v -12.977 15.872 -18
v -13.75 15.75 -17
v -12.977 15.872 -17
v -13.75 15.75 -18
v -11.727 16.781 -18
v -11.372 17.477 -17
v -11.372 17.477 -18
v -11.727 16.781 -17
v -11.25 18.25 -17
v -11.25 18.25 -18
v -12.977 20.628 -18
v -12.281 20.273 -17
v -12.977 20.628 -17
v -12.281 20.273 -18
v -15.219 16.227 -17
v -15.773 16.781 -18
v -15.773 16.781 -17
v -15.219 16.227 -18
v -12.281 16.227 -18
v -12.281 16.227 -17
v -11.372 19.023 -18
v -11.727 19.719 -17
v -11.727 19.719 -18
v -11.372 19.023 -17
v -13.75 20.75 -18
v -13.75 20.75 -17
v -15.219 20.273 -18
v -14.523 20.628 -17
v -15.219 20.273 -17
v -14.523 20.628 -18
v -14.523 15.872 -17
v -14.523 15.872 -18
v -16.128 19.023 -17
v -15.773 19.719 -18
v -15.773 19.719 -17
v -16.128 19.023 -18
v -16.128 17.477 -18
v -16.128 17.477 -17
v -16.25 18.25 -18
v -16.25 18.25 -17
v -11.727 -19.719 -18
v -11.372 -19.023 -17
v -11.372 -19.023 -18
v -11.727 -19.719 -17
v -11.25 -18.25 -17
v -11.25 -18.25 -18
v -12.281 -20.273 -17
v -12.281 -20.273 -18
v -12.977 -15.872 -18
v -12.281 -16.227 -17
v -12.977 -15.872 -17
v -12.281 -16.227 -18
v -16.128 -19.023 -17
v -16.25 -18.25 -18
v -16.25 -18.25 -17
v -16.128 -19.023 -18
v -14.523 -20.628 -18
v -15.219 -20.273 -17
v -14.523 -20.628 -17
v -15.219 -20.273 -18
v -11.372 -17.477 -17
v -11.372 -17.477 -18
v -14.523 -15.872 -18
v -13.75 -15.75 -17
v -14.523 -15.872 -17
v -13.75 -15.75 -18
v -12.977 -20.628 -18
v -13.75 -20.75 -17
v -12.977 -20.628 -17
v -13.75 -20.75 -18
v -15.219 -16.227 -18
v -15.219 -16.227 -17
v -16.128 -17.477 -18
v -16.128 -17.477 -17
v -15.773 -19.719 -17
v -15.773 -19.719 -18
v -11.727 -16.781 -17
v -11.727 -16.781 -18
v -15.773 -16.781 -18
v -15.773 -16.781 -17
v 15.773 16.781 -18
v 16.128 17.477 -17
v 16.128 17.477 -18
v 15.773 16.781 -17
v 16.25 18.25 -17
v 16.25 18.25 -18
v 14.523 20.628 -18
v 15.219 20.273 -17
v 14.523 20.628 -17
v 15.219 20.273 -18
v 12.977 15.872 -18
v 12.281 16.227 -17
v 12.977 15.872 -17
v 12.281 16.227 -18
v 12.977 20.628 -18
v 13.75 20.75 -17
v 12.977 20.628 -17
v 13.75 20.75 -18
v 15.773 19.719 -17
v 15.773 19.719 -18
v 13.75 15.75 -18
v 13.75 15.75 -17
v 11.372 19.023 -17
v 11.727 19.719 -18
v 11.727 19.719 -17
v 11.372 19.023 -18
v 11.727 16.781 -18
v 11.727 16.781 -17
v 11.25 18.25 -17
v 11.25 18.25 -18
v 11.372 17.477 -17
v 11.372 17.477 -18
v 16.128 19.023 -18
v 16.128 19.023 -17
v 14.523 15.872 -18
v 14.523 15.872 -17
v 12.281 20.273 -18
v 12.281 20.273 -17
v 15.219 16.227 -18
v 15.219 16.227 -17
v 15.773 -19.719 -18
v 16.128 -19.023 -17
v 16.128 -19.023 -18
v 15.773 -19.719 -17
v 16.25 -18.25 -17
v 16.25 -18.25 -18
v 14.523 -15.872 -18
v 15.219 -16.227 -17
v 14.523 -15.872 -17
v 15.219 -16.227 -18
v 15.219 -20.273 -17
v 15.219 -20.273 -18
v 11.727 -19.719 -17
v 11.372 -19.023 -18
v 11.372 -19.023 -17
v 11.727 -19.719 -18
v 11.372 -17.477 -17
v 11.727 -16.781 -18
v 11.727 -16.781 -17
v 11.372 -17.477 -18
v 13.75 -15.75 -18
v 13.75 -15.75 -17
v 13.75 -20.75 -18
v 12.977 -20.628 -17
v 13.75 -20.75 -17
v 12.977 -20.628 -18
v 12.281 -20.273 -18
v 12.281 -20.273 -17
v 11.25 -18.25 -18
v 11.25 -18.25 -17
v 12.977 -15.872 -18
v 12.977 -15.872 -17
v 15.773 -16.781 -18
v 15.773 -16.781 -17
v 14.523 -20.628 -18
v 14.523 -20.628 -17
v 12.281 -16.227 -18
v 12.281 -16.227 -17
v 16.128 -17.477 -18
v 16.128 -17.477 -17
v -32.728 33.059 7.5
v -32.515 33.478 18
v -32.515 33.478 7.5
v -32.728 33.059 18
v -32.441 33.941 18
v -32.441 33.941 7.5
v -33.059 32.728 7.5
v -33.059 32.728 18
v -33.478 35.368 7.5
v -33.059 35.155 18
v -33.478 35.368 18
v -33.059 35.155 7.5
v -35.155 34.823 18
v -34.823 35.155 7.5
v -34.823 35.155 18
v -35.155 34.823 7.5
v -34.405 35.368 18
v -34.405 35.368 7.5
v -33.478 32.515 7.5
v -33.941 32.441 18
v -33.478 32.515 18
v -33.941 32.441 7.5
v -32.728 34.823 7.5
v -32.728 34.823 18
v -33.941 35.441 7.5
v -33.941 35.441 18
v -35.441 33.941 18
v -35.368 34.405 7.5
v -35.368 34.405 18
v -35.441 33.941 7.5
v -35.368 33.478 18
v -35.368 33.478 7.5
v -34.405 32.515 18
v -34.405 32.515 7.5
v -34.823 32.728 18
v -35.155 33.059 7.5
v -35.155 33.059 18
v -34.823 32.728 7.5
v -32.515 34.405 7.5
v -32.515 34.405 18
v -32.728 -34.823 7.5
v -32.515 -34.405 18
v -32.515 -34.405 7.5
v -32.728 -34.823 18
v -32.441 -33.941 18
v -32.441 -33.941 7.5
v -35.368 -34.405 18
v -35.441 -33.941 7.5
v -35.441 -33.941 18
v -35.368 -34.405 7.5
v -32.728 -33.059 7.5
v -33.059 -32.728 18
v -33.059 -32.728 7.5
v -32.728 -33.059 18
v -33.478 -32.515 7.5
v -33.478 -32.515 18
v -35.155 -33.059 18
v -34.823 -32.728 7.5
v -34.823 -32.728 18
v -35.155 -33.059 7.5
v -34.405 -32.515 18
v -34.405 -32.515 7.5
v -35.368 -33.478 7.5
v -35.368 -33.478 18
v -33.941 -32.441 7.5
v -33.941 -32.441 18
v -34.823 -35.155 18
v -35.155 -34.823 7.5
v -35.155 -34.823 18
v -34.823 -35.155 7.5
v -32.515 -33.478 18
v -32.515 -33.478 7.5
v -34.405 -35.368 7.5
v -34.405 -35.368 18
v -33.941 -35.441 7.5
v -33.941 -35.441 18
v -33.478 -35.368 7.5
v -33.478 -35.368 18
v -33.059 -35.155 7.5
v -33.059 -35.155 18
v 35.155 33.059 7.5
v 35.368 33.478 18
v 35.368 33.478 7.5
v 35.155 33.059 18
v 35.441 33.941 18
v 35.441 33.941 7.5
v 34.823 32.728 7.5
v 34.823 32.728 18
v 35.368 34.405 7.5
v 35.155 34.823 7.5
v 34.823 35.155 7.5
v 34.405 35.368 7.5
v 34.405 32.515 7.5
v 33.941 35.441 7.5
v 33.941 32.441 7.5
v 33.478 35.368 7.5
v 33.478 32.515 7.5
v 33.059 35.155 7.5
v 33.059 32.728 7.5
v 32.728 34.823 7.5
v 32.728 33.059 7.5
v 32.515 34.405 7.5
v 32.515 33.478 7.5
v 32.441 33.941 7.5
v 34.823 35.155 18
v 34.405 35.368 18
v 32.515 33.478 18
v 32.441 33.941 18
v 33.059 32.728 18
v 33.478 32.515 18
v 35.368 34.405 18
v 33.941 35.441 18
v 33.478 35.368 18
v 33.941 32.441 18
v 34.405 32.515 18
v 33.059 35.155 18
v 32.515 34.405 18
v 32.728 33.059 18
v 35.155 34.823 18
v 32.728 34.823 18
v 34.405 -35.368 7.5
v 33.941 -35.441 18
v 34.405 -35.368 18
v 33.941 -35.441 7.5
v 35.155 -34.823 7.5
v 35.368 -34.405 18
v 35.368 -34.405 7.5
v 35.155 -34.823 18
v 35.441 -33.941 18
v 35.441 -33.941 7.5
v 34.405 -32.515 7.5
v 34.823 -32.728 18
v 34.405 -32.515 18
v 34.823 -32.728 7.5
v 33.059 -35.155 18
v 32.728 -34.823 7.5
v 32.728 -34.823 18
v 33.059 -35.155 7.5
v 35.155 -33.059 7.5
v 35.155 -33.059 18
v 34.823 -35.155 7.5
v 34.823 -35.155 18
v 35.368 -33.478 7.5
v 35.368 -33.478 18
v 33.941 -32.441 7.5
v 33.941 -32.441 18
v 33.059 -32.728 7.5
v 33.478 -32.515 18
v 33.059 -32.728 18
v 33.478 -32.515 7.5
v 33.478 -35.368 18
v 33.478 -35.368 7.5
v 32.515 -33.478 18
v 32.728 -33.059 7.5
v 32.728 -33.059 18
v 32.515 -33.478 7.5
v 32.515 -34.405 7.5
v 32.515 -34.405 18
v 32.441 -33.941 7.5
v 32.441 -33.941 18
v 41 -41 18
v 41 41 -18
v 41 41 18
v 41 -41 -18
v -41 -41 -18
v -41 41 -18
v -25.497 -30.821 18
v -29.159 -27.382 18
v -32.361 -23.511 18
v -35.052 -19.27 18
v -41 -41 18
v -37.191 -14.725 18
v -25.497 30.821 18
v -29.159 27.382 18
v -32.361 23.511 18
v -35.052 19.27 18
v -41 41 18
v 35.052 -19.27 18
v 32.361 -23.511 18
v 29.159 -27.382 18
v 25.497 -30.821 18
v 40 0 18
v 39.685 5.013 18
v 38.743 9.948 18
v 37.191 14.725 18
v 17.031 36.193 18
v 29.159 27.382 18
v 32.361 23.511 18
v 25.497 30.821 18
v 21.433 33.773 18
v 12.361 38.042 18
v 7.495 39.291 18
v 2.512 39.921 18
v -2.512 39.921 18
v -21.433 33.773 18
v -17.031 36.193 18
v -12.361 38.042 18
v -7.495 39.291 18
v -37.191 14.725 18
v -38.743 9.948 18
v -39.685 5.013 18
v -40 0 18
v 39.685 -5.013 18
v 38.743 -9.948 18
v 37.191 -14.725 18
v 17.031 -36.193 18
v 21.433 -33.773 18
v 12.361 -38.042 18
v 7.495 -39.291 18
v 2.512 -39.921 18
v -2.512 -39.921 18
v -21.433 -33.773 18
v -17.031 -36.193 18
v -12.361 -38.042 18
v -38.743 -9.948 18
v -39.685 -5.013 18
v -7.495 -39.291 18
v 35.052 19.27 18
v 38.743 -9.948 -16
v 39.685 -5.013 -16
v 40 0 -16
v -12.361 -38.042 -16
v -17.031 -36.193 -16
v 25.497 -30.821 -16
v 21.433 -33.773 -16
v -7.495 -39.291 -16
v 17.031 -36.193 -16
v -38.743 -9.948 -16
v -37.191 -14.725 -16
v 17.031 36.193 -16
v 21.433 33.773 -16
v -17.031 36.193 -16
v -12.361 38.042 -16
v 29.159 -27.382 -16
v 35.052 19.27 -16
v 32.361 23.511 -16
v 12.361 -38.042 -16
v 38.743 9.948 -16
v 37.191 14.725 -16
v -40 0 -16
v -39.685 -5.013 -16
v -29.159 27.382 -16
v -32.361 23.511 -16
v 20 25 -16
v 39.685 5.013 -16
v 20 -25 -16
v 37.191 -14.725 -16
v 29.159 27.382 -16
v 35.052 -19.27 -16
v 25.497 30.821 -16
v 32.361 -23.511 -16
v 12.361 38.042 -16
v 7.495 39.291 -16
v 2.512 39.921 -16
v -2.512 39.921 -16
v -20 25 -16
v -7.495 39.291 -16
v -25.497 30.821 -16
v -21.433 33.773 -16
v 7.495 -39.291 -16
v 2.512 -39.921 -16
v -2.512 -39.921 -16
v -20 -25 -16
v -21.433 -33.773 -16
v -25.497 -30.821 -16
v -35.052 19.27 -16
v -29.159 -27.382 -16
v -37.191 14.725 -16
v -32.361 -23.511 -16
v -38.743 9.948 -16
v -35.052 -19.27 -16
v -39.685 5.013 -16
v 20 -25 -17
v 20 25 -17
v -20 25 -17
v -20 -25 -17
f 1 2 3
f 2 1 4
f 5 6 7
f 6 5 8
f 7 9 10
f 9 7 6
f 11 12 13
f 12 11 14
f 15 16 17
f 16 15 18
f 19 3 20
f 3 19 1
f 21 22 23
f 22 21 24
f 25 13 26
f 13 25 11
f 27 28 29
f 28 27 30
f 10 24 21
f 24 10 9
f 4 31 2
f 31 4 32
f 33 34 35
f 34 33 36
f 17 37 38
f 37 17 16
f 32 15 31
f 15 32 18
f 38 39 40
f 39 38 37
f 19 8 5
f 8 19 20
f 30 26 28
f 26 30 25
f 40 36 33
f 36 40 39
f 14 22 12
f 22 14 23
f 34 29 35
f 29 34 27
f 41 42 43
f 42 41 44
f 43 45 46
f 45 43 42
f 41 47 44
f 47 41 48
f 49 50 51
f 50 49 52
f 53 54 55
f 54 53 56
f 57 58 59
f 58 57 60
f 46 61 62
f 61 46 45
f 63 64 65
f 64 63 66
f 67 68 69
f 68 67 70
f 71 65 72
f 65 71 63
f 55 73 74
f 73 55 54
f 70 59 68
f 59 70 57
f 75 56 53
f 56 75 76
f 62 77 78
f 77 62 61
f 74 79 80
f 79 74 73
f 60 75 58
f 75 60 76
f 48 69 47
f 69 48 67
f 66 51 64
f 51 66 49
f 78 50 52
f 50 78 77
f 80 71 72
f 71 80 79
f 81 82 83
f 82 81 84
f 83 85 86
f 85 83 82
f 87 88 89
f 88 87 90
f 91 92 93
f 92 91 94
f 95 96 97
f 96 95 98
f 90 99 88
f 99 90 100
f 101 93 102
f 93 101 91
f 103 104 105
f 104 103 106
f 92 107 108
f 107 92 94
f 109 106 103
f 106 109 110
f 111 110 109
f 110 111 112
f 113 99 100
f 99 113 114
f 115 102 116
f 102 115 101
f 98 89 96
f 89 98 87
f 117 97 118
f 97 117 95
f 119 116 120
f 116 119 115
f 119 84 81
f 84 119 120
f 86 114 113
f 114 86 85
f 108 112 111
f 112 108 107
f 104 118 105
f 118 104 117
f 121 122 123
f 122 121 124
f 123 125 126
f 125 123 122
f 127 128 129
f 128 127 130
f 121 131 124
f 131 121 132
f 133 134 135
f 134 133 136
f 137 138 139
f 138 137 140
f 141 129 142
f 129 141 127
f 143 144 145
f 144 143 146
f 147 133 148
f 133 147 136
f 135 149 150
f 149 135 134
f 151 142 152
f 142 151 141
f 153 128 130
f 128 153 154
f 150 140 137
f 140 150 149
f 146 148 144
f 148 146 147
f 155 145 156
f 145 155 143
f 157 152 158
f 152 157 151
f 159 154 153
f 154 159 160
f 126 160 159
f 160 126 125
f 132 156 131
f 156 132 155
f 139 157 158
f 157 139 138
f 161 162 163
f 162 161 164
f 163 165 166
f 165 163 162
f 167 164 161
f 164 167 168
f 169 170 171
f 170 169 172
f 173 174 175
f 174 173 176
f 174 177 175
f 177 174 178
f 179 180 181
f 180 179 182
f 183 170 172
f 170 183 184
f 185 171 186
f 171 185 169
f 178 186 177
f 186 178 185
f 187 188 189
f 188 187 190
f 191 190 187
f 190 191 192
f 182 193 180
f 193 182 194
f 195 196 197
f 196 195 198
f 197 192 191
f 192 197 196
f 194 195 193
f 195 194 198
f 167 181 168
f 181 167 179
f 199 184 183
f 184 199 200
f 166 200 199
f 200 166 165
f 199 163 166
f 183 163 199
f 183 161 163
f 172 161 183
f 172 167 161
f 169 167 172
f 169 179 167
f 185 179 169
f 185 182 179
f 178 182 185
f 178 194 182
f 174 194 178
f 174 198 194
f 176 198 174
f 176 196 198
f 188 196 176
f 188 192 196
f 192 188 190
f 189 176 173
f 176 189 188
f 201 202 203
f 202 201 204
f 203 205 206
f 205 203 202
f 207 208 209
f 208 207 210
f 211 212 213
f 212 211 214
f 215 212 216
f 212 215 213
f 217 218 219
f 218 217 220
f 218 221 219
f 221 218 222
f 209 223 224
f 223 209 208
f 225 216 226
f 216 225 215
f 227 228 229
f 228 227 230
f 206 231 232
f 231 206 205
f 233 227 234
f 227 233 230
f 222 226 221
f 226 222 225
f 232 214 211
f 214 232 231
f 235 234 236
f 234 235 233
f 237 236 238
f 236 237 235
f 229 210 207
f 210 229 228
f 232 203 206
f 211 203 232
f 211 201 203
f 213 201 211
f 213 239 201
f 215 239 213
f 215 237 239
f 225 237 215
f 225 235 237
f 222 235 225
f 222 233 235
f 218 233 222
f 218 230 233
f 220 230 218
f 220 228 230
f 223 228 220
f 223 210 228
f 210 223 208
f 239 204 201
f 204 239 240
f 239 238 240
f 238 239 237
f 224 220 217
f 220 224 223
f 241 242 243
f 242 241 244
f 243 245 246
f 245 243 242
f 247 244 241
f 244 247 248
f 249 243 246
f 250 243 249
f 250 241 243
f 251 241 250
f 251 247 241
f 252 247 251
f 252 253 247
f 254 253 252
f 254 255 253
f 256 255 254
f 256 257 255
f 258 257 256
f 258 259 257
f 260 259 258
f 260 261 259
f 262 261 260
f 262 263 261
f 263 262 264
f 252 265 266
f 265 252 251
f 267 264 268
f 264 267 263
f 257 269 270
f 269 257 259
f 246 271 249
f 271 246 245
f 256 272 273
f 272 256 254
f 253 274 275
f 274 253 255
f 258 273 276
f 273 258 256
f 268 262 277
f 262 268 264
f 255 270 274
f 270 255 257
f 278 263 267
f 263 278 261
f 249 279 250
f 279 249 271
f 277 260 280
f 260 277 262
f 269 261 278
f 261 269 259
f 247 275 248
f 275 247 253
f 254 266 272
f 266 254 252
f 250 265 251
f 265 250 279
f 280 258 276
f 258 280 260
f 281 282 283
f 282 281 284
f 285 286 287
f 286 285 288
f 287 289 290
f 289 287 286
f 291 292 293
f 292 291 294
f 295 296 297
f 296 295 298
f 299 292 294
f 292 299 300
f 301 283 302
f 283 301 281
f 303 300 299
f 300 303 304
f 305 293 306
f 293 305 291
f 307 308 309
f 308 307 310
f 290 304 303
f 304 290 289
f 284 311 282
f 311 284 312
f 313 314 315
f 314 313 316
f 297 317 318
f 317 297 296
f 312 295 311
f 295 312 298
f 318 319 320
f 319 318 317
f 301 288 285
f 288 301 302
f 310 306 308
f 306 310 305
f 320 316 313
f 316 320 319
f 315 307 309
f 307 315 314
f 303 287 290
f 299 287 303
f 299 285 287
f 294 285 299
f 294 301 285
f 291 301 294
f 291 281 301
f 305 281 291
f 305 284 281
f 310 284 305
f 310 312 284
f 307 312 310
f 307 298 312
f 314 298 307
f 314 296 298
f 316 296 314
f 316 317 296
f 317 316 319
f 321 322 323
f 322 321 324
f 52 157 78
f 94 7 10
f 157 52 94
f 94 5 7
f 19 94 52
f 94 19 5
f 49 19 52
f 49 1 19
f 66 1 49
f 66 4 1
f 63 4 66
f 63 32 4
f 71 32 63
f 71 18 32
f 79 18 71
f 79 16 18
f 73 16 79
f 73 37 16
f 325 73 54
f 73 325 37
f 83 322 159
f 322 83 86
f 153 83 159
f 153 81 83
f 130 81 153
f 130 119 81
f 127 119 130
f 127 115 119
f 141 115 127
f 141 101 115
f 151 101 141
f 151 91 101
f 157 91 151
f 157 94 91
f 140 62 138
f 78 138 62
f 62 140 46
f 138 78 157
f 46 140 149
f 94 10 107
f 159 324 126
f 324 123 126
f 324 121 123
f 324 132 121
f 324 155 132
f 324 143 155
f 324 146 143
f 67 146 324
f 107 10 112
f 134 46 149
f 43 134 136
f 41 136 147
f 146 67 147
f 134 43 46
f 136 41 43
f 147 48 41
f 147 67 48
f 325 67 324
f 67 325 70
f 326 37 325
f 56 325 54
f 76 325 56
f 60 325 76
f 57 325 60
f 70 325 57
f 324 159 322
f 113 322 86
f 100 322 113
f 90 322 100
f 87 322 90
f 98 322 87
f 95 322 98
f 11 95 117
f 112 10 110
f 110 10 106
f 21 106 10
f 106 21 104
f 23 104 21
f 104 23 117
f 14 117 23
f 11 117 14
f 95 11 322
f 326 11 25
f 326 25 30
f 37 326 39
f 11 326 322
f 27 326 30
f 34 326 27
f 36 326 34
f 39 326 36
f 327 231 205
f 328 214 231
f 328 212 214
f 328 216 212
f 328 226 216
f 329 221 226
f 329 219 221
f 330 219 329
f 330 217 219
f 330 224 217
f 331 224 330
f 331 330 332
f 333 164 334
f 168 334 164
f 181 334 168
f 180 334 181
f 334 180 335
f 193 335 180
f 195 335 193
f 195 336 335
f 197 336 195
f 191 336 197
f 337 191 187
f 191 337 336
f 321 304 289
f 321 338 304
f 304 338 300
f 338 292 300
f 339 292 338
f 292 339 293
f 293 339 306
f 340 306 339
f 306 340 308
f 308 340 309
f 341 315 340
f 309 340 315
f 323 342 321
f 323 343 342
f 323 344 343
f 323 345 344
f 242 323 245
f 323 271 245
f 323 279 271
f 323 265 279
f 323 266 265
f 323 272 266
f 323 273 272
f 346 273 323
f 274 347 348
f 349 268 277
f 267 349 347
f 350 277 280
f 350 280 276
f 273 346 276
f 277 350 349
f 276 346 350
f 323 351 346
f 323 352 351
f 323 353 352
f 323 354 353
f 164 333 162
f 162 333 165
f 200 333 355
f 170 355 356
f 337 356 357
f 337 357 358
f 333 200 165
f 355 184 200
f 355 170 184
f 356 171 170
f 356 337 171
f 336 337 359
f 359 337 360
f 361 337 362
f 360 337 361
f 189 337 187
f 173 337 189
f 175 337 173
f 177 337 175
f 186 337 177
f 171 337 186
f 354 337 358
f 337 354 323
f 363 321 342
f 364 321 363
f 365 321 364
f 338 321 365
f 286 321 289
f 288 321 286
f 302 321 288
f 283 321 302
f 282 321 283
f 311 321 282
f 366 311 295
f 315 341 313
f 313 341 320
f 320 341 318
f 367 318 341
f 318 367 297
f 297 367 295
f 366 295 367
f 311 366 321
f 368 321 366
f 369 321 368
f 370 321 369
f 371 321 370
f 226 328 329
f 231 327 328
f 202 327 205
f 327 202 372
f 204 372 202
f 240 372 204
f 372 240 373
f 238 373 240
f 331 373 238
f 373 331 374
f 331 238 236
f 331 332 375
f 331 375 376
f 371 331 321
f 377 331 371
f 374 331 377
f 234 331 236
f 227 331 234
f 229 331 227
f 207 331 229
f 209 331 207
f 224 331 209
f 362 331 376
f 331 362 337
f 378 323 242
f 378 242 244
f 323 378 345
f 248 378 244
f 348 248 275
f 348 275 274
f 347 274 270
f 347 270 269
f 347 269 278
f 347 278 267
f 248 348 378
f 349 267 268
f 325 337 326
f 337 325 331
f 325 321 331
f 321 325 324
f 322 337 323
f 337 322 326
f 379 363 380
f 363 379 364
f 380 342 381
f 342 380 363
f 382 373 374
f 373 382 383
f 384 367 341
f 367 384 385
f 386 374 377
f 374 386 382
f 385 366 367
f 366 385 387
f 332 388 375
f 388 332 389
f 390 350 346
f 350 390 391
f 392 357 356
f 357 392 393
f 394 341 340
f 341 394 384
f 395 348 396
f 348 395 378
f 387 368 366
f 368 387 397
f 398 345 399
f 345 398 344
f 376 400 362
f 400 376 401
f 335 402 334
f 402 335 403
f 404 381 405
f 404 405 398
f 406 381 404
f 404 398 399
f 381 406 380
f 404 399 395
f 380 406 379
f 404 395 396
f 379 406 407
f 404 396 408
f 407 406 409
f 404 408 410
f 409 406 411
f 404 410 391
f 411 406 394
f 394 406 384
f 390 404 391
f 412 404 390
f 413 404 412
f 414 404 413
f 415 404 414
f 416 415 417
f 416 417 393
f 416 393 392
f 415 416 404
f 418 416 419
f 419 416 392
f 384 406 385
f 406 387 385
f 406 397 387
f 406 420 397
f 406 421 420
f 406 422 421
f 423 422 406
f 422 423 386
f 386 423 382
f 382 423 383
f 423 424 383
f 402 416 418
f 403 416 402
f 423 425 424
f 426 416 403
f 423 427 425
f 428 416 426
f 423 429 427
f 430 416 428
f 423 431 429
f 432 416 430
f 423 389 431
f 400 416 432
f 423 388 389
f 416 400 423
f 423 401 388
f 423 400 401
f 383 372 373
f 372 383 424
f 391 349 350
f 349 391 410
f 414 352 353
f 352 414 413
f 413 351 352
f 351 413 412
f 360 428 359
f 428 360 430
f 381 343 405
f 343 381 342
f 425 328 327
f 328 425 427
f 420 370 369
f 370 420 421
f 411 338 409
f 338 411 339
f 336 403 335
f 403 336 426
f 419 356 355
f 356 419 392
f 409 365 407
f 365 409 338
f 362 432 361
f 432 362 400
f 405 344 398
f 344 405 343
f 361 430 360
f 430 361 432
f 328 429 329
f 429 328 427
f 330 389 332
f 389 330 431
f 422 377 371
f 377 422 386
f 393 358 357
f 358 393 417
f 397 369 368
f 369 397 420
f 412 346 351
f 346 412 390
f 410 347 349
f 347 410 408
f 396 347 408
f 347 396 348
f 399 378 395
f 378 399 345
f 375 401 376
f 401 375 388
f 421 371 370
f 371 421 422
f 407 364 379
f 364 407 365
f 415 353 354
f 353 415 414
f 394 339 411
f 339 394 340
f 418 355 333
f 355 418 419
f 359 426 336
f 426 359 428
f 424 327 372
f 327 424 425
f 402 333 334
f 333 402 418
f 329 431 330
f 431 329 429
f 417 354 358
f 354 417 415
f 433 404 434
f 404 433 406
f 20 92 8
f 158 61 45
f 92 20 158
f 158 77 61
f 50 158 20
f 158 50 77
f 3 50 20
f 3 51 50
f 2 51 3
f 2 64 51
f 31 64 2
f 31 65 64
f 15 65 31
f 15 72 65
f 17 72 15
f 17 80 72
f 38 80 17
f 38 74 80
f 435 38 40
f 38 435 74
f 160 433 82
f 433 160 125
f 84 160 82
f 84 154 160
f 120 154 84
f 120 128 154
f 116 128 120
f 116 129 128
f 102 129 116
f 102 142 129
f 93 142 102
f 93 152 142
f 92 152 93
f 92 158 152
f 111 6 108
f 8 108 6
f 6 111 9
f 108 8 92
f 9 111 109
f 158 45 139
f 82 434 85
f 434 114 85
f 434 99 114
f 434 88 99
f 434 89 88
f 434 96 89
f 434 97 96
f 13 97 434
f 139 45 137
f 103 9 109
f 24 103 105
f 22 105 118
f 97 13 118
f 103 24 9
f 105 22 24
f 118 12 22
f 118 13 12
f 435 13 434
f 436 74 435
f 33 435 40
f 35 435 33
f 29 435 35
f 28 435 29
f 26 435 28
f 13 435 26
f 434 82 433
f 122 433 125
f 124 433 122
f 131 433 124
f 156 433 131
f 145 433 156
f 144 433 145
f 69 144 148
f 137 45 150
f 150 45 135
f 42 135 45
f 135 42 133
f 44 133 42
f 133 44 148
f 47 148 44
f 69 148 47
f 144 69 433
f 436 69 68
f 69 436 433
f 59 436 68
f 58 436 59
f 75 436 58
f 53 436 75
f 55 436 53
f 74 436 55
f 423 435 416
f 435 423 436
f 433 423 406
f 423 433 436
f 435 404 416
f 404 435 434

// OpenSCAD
module plaqueDessous() {
    difference() {
        intersection() {
            translate([-200+130,0,0]) cube([400,300,9], center=true);

            cylinder(r=270,h=9,center=true,$fn=100);

            translate([-228.5/sqrt(2),0,0]) rotate([0,0,45]) cube([500,500,10],center=true);
        }

        for(y=[-165+25,165-25]) {
            translate([0,y,0]) cube([50,30,10],center=true);
            translate([0,y,10]) rotate([0,45,0]) cube([50,30,50],center=true);
        }
    }
}

module barres(ep = 50) {
// Barre front
    difference() {
        translate([120,0,0]) cube([20,124,ep],center=true);    
// Bizots côté 
        for (i=[-1,1]) rotate([0,0,i*45/2]) translate([130,i*17.51,0]) cube([30,20,ep+2],center=true);
// Emplacement US
        translate([118.1,0,-14.5+2]) rotate([0,90,0]) US();
// Rainure haute (leds)
    translate([118,0,12.5]) cube([20,128,20],center=true);
// Avant-trous        
        for(y=[-50,50]) translate([120,y,0]) cylinder(d=3,h=ep+2,$fn=10,center=true);
    }

// Barres gauche et droite
    for (i=[-1,1]) difference() {
        translate([103.85/sqrt(2),i*147.68/sqrt(2),0]) rotate([0,0,i*45]) cube([20,140,ep],center=true);
        translate([0,i*145,0]) cube([70,40,ep+2],center=true);
        translate([0,i*160,0]) cube([100,20,ep+2],center=true);
// Bizots côté 
        rotate([0,0,i*45/2]) translate([130,i*(17.51-20),0]) cube([30,20,ep+2],center=true);
// Emplacement US
        translate([85.1,i*90,-14.5+2]) rotate([0,90,i*45]) US(20);
// Rainure haute (leds)
    translate([81.86-5,i*94+i*5,12.5]) rotate([0,0,i*45]) cube([20,140,20],center=true);
// Avant-trous        
        for(y=[-45,45]) rotate([0,0,i*45]) translate([125,i*(15+y),0]) cylinder(d=3,h=ep+2,$fn=10,center=true);
            
// Passage roue
        translate([35,i*140,-10]) cube([10,40,ep-20],center=true);
    }


// Barre arrière
    union() {
        intersection() {
            difference() {
                cylinder(r=270,h=ep,$fn=200,center=true);
                cylinder(r=250,h=ep+2,$fn=200,center=true);
                translate([0,0,12.5]) cylinder(r=268,h=20,$fn=200,center=true);
                translate([-258,0,-12]) rotate([0,-90,0]) US(ep);
            }
            translate([-235,0,0]) cube([75,300,60], center=true);
        }
        
// Barres côtés
        for (i=[-1,1]) translate([-130,i*140,0]) cube([185,20,ep],center=true);

    }
}

module US(ep=50) {
translate([0,0,-ep/2]) cube([21.5,45.5,ep],center=true);
for (i=[-1,1]) translate([0,i*12.77,5.75]) cylinder(d=16.5,h=12.5,$fn=50,center=true);
for (x=[-8,8]) hull() for(y=[-3,3]) translate([x,y,3.5/2]) cylinder(d=5,h=4,$fn=20,center=true);
}

*translate([0,0,-4.5]) color("brown") plaqueDessous();

// Roues avant
*for (y=[-140,140]) translate([0,y,20]) rotate([90,0,0]) cylinder(d=67,h=25,center=true);

// Epaisseur latérale 50mm
*translate([0,0,25]) color("white") barres(50);

// Plaque dessus
*translate([0,0, 59-4.5]) rotate([180,0,0]) plaqueDessous();


module cloche(h=35) {
    difference() {
        cube([82,82,h+1],center=true);
        translate([0,0,-2.5]) cylinder(r=40,h=h+2,$fn=50,center=true);
        translate([0,0,h/2-3]) cube([40,50,5],center=true);
        for (x=[-27.5/2,27.5/2],y=[-36.5/2,36.5/2]) {
            translate([x,y,h/2]) cylinder(d=5,h=5,$fn=20,center=true);
        }
        for (d=24,x=[-d*sqrt(2),d*sqrt(2)],y=[-d*sqrt(2),d*sqrt(2)]) {
            translate([x,y,-h/2]) cylinder(d=3,h=20,$fn=20,center=true);
        }
    }
}

rotate([180,0,0]) cloche();
